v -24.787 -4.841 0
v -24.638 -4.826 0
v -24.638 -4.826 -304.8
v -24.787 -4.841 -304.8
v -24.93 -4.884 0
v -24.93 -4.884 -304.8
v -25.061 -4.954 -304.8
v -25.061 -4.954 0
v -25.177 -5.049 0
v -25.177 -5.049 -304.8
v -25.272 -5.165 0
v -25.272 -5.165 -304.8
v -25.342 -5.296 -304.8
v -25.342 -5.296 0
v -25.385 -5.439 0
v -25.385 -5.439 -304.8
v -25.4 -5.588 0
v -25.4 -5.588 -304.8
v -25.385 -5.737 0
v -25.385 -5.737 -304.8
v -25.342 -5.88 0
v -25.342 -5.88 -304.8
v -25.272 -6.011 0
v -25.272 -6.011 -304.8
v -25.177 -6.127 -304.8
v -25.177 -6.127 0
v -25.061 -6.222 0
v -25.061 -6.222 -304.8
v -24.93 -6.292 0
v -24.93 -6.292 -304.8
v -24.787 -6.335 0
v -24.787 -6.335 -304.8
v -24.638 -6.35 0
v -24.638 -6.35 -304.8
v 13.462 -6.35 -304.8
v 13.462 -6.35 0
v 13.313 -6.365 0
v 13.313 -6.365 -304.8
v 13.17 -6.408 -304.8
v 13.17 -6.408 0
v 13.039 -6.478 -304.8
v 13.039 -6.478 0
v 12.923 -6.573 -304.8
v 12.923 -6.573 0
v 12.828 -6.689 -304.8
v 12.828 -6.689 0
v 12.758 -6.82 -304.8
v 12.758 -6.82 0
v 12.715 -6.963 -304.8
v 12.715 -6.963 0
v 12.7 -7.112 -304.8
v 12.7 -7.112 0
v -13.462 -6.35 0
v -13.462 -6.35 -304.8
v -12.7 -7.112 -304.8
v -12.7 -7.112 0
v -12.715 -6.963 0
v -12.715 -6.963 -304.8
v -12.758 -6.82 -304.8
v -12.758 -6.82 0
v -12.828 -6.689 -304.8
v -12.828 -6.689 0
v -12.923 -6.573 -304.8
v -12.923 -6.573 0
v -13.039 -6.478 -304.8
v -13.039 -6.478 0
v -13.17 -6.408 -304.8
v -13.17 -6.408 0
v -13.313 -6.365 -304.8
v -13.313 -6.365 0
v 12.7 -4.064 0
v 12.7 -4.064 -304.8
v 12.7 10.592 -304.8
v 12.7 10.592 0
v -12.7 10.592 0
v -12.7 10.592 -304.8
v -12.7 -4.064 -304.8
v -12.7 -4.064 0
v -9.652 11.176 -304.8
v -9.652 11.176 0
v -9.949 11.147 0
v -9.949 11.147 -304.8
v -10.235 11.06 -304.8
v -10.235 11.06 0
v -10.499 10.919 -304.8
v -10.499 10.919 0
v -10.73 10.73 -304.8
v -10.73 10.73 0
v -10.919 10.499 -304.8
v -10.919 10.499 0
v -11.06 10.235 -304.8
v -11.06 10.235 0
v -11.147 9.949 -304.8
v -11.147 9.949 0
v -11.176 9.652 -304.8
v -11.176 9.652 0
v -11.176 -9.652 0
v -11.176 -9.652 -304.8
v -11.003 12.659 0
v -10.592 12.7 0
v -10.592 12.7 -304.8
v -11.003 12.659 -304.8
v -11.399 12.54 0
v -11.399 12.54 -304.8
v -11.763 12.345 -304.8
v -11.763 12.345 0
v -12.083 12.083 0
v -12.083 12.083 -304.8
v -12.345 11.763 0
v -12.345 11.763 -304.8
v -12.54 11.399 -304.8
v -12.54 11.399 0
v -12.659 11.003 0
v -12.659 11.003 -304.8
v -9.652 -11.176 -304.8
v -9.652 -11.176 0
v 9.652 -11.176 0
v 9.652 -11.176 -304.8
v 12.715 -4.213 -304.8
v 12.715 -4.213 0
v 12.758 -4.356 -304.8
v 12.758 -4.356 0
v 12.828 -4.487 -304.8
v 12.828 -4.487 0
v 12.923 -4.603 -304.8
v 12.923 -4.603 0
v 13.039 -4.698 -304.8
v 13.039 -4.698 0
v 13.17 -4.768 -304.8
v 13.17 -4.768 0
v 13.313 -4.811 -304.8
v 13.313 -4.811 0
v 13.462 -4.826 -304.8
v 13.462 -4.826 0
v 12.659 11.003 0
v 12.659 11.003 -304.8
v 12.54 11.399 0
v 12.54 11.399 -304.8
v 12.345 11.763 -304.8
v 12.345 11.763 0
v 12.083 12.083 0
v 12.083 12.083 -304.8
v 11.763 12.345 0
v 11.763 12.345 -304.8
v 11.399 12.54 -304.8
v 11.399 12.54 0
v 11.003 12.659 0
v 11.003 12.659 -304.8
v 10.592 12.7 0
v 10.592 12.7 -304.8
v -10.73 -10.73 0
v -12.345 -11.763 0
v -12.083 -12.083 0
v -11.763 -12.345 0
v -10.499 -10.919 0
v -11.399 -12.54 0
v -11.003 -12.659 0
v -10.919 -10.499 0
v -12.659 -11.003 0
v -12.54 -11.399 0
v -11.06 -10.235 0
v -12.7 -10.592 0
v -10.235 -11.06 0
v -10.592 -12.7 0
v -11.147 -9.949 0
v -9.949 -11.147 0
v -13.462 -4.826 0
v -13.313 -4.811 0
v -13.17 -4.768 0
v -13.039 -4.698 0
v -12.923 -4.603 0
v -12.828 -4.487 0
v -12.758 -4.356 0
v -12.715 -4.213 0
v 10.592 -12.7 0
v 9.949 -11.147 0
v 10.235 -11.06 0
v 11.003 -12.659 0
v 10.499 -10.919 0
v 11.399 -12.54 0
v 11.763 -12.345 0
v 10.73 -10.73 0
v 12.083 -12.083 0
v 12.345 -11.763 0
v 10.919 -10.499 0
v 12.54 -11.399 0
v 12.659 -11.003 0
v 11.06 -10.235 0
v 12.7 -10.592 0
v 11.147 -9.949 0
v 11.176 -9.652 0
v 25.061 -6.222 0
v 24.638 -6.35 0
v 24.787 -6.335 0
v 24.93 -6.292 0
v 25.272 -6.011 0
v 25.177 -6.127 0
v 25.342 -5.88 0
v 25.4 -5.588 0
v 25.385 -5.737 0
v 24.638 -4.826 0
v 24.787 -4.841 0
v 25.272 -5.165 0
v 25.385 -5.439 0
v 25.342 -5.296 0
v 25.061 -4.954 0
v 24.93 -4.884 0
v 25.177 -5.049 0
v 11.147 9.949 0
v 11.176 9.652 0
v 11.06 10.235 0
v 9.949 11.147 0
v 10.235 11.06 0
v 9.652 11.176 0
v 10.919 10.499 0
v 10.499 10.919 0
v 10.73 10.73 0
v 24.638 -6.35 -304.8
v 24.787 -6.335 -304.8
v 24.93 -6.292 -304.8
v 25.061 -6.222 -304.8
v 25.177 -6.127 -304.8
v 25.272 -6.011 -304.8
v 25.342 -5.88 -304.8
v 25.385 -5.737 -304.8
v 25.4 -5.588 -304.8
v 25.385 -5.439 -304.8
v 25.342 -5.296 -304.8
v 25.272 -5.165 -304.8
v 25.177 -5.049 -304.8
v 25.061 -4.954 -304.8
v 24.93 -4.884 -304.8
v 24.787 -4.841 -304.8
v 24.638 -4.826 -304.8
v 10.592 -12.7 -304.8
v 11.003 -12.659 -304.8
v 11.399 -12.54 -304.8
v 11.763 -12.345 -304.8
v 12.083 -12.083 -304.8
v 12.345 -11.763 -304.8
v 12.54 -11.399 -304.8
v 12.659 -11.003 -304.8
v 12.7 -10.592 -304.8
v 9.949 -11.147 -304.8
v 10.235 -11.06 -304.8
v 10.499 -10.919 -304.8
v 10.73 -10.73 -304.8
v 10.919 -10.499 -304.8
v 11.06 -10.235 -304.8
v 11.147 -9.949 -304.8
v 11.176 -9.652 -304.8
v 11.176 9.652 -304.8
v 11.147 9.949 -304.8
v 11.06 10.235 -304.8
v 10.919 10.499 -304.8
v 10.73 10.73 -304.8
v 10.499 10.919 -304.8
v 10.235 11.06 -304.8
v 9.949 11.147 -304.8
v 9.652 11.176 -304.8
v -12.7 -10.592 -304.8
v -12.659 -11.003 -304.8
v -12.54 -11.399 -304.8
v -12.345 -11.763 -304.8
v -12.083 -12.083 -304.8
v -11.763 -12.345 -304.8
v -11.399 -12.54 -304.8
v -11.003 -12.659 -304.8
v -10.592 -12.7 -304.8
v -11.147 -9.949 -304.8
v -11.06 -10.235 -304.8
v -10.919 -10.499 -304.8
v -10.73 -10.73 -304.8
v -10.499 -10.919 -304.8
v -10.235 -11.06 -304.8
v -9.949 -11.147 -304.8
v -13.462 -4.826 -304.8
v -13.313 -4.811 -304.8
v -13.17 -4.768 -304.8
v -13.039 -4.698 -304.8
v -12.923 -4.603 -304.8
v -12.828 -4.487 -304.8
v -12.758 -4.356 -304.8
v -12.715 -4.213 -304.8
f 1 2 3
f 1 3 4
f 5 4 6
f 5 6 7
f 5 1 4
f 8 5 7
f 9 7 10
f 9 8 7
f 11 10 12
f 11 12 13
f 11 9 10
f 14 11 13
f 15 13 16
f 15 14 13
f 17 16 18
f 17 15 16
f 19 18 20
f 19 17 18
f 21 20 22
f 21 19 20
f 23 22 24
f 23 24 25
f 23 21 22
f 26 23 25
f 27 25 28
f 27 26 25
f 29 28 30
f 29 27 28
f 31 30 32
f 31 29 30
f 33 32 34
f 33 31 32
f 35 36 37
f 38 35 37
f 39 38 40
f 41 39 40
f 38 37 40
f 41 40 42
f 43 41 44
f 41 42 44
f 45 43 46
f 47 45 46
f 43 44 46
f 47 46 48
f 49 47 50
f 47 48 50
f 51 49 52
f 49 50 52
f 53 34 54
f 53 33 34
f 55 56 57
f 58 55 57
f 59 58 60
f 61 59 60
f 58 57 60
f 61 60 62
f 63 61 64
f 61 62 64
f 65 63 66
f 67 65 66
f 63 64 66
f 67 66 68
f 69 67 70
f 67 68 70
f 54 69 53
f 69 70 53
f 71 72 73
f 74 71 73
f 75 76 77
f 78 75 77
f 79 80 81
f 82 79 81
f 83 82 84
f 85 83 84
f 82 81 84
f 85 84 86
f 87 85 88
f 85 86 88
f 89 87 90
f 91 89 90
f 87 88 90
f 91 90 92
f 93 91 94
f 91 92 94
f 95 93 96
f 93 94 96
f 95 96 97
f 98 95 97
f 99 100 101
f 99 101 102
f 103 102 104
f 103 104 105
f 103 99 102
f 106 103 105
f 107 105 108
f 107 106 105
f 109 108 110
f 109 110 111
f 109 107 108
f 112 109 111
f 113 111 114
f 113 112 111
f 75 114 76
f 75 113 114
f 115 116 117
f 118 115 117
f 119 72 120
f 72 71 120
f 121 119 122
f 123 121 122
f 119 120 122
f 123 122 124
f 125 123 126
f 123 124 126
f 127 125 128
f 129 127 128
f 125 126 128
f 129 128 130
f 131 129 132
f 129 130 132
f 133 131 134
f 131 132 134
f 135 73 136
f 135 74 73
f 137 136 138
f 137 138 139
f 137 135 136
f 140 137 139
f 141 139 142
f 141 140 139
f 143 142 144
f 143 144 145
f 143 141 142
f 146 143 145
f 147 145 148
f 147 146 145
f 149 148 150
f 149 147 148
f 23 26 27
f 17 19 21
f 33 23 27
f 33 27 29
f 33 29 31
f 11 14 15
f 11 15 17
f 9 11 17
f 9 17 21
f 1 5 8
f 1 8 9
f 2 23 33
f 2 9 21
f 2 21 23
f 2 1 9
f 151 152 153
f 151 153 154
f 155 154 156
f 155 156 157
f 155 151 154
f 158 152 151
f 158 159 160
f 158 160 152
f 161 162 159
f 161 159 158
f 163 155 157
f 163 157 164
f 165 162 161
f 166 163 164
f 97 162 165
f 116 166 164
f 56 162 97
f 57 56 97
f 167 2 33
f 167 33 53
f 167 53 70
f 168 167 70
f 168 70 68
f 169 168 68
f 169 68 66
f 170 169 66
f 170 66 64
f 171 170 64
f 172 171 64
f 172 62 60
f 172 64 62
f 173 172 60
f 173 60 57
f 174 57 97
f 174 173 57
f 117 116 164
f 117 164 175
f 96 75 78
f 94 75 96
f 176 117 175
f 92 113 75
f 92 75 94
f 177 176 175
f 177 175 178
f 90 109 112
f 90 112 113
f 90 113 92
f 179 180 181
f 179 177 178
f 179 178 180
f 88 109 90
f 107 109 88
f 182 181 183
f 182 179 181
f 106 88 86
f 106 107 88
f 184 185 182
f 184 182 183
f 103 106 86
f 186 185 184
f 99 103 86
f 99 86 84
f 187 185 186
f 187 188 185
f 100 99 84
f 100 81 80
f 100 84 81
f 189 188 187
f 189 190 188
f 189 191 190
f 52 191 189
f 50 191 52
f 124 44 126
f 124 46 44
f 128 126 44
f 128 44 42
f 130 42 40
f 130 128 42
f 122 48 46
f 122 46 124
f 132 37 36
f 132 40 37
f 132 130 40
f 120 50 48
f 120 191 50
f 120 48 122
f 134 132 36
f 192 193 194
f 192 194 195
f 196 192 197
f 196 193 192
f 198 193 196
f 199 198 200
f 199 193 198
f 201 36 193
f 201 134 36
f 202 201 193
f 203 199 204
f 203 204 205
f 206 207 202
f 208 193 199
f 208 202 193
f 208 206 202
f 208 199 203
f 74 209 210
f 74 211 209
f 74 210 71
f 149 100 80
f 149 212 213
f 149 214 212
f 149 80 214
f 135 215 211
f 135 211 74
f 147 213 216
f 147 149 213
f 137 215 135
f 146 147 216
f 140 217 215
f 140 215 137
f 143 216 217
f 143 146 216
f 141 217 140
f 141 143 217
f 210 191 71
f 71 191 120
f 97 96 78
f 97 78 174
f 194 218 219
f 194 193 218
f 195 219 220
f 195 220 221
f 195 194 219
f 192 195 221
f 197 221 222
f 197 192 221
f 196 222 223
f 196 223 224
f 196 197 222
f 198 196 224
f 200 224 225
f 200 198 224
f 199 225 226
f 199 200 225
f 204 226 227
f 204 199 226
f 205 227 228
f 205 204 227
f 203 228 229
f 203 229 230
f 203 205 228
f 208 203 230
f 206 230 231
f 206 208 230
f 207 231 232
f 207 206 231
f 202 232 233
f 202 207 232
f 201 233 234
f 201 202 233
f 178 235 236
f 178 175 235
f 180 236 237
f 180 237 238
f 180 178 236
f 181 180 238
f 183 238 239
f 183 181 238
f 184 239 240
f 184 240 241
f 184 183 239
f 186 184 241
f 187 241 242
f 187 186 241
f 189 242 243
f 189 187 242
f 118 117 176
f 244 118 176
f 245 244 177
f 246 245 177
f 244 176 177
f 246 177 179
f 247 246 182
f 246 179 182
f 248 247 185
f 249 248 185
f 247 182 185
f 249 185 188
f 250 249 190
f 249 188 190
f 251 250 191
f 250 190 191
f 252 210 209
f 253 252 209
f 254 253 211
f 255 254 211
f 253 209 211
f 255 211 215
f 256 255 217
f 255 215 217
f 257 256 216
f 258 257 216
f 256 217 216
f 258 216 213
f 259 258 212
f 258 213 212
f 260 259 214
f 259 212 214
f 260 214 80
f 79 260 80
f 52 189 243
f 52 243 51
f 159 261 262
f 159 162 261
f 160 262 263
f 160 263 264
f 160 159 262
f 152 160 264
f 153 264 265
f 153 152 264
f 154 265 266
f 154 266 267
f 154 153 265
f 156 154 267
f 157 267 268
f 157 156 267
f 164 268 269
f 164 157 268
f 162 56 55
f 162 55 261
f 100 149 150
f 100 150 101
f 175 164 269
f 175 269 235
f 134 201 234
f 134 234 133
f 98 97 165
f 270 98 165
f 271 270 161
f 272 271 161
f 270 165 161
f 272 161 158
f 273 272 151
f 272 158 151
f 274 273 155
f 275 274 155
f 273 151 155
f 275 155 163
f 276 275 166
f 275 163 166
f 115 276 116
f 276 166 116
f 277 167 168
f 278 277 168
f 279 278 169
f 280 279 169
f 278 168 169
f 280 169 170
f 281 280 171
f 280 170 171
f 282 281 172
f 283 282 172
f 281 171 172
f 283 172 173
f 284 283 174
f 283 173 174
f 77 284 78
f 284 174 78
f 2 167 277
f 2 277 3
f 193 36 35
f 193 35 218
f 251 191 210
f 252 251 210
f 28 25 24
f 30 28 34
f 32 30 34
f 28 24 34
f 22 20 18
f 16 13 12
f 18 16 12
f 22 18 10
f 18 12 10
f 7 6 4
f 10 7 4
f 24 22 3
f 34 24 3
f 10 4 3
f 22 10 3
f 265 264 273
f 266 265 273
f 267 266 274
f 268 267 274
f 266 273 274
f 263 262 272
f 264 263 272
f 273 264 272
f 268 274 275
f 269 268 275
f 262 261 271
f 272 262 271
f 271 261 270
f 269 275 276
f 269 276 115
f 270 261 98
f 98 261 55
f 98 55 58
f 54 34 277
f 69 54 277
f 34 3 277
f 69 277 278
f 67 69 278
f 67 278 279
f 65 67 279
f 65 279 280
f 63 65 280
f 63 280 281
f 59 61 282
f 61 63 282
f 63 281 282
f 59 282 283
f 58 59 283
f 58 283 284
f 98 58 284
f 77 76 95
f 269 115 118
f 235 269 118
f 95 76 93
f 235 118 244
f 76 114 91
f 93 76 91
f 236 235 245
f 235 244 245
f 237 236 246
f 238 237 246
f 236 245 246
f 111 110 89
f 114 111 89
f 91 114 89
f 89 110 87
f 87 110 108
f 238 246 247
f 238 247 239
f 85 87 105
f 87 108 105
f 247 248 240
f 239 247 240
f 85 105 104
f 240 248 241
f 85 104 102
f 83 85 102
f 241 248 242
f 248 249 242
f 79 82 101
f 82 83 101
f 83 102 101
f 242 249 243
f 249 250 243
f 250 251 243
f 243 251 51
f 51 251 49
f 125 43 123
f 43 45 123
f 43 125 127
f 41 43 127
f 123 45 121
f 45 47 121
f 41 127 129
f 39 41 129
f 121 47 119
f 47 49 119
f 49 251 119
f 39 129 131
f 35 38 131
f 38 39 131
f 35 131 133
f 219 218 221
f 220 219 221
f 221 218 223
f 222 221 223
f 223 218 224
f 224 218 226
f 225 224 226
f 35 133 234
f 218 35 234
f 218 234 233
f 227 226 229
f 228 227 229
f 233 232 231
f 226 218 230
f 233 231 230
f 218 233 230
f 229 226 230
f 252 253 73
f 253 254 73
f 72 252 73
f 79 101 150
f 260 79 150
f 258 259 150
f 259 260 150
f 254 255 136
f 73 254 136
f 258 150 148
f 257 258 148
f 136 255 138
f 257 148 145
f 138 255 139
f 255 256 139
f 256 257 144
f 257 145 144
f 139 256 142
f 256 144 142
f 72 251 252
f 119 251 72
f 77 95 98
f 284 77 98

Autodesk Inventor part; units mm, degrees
ref_plane "YZ Plane" through (0, 0, 0) normal (1, 0, 0) x (0, 1, 0)
ref_plane "XZ Plane" through (0, 0, 0) normal (0, 1, 0) x (-1, 0, 0)
ref_plane "XY Plane" through (0, 0, 0) normal (0, 0, 1) x (1, 0, 0)
sketch "Sketch1" plane through (0, 0, 0) normal (0, 0, 1) x (1, 0, 0)
  line L0 (11.176, -9.652) -> (11.176, 9.652)
  arc A0 (9.652, -11.176) -> (11.176, -9.652) centre (9.652, -9.652) ccw
  line L1 (-9.652, -11.176) -> (9.652, -11.176)
  arc A1 (-11.176, -9.652) -> (-9.652, -11.176) centre (-9.652, -9.652) ccw
  line L2 (-11.176, 9.652) -> (-11.176, -9.652)
  arc A2 (-9.652, 11.176) -> (-11.176, 9.652) centre (-9.652, 9.652) ccw
  line L3 (9.652, 11.176) -> (-9.652, 11.176)
  arc A3 (11.176, 9.652) -> (9.652, 11.176) centre (9.652, 9.652) ccw
  arc A4 (12.7, -4.064) -> (13.462, -4.826) centre (13.462, -4.064) ccw
  line L4 (12.7, -4.064) -> (12.7, 10.5918)
  arc A5 (12.7, 10.5918) -> (10.5918, 12.7) centre (10.5918, 10.5918) ccw
  line L5 (10.5918, 12.7) -> (-10.5918, 12.7)
  arc A6 (-10.5918, 12.7) -> (-12.7, 10.5918) centre (-10.5918, 10.5918) ccw
  line L6 (-12.7, 10.5918) -> (-12.7, -4.064)
  arc A7 (-13.462, -4.826) -> (-12.7, -4.064) centre (-13.462, -4.064) ccw
  line L7 (-13.462, -4.826) -> (-24.638, -4.826)
  arc A8 (-24.638, -4.826) -> (-24.638, -6.35) centre (-24.638, -5.588) ccw
  line L8 (-24.638, -6.35) -> (-13.462, -6.35)
  arc A9 (-12.7, -7.112) -> (-13.462, -6.35) centre (-13.462, -7.112) ccw
  line L9 (-12.7, -7.112) -> (-12.7, -10.5918)
  arc A10 (-12.7, -10.5918) -> (-10.5918, -12.7) centre (-10.5918, -10.5918) ccw
  line L10 (-10.5918, -12.7) -> (10.5918, -12.7)
  arc A11 (10.5918, -12.7) -> (12.7, -10.5918) centre (10.5918, -10.5918) ccw
  line L11 (12.7, -10.5918) -> (12.7, -7.112)
  arc A12 (13.462, -6.35) -> (12.7, -7.112) centre (13.462, -7.112) ccw
  line L12 (13.462, -6.35) -> (24.638, -6.35)
  arc A13 (24.638, -6.35) -> (24.638, -4.826) centre (24.638, -5.588) ccw
  line L13 (24.638, -4.826) -> (13.462, -4.826)
  point P0 (0, 0)
extrude "Extrusion1" add sketch "Sketch1" against normal blind 304.8
properties part number "9015"
